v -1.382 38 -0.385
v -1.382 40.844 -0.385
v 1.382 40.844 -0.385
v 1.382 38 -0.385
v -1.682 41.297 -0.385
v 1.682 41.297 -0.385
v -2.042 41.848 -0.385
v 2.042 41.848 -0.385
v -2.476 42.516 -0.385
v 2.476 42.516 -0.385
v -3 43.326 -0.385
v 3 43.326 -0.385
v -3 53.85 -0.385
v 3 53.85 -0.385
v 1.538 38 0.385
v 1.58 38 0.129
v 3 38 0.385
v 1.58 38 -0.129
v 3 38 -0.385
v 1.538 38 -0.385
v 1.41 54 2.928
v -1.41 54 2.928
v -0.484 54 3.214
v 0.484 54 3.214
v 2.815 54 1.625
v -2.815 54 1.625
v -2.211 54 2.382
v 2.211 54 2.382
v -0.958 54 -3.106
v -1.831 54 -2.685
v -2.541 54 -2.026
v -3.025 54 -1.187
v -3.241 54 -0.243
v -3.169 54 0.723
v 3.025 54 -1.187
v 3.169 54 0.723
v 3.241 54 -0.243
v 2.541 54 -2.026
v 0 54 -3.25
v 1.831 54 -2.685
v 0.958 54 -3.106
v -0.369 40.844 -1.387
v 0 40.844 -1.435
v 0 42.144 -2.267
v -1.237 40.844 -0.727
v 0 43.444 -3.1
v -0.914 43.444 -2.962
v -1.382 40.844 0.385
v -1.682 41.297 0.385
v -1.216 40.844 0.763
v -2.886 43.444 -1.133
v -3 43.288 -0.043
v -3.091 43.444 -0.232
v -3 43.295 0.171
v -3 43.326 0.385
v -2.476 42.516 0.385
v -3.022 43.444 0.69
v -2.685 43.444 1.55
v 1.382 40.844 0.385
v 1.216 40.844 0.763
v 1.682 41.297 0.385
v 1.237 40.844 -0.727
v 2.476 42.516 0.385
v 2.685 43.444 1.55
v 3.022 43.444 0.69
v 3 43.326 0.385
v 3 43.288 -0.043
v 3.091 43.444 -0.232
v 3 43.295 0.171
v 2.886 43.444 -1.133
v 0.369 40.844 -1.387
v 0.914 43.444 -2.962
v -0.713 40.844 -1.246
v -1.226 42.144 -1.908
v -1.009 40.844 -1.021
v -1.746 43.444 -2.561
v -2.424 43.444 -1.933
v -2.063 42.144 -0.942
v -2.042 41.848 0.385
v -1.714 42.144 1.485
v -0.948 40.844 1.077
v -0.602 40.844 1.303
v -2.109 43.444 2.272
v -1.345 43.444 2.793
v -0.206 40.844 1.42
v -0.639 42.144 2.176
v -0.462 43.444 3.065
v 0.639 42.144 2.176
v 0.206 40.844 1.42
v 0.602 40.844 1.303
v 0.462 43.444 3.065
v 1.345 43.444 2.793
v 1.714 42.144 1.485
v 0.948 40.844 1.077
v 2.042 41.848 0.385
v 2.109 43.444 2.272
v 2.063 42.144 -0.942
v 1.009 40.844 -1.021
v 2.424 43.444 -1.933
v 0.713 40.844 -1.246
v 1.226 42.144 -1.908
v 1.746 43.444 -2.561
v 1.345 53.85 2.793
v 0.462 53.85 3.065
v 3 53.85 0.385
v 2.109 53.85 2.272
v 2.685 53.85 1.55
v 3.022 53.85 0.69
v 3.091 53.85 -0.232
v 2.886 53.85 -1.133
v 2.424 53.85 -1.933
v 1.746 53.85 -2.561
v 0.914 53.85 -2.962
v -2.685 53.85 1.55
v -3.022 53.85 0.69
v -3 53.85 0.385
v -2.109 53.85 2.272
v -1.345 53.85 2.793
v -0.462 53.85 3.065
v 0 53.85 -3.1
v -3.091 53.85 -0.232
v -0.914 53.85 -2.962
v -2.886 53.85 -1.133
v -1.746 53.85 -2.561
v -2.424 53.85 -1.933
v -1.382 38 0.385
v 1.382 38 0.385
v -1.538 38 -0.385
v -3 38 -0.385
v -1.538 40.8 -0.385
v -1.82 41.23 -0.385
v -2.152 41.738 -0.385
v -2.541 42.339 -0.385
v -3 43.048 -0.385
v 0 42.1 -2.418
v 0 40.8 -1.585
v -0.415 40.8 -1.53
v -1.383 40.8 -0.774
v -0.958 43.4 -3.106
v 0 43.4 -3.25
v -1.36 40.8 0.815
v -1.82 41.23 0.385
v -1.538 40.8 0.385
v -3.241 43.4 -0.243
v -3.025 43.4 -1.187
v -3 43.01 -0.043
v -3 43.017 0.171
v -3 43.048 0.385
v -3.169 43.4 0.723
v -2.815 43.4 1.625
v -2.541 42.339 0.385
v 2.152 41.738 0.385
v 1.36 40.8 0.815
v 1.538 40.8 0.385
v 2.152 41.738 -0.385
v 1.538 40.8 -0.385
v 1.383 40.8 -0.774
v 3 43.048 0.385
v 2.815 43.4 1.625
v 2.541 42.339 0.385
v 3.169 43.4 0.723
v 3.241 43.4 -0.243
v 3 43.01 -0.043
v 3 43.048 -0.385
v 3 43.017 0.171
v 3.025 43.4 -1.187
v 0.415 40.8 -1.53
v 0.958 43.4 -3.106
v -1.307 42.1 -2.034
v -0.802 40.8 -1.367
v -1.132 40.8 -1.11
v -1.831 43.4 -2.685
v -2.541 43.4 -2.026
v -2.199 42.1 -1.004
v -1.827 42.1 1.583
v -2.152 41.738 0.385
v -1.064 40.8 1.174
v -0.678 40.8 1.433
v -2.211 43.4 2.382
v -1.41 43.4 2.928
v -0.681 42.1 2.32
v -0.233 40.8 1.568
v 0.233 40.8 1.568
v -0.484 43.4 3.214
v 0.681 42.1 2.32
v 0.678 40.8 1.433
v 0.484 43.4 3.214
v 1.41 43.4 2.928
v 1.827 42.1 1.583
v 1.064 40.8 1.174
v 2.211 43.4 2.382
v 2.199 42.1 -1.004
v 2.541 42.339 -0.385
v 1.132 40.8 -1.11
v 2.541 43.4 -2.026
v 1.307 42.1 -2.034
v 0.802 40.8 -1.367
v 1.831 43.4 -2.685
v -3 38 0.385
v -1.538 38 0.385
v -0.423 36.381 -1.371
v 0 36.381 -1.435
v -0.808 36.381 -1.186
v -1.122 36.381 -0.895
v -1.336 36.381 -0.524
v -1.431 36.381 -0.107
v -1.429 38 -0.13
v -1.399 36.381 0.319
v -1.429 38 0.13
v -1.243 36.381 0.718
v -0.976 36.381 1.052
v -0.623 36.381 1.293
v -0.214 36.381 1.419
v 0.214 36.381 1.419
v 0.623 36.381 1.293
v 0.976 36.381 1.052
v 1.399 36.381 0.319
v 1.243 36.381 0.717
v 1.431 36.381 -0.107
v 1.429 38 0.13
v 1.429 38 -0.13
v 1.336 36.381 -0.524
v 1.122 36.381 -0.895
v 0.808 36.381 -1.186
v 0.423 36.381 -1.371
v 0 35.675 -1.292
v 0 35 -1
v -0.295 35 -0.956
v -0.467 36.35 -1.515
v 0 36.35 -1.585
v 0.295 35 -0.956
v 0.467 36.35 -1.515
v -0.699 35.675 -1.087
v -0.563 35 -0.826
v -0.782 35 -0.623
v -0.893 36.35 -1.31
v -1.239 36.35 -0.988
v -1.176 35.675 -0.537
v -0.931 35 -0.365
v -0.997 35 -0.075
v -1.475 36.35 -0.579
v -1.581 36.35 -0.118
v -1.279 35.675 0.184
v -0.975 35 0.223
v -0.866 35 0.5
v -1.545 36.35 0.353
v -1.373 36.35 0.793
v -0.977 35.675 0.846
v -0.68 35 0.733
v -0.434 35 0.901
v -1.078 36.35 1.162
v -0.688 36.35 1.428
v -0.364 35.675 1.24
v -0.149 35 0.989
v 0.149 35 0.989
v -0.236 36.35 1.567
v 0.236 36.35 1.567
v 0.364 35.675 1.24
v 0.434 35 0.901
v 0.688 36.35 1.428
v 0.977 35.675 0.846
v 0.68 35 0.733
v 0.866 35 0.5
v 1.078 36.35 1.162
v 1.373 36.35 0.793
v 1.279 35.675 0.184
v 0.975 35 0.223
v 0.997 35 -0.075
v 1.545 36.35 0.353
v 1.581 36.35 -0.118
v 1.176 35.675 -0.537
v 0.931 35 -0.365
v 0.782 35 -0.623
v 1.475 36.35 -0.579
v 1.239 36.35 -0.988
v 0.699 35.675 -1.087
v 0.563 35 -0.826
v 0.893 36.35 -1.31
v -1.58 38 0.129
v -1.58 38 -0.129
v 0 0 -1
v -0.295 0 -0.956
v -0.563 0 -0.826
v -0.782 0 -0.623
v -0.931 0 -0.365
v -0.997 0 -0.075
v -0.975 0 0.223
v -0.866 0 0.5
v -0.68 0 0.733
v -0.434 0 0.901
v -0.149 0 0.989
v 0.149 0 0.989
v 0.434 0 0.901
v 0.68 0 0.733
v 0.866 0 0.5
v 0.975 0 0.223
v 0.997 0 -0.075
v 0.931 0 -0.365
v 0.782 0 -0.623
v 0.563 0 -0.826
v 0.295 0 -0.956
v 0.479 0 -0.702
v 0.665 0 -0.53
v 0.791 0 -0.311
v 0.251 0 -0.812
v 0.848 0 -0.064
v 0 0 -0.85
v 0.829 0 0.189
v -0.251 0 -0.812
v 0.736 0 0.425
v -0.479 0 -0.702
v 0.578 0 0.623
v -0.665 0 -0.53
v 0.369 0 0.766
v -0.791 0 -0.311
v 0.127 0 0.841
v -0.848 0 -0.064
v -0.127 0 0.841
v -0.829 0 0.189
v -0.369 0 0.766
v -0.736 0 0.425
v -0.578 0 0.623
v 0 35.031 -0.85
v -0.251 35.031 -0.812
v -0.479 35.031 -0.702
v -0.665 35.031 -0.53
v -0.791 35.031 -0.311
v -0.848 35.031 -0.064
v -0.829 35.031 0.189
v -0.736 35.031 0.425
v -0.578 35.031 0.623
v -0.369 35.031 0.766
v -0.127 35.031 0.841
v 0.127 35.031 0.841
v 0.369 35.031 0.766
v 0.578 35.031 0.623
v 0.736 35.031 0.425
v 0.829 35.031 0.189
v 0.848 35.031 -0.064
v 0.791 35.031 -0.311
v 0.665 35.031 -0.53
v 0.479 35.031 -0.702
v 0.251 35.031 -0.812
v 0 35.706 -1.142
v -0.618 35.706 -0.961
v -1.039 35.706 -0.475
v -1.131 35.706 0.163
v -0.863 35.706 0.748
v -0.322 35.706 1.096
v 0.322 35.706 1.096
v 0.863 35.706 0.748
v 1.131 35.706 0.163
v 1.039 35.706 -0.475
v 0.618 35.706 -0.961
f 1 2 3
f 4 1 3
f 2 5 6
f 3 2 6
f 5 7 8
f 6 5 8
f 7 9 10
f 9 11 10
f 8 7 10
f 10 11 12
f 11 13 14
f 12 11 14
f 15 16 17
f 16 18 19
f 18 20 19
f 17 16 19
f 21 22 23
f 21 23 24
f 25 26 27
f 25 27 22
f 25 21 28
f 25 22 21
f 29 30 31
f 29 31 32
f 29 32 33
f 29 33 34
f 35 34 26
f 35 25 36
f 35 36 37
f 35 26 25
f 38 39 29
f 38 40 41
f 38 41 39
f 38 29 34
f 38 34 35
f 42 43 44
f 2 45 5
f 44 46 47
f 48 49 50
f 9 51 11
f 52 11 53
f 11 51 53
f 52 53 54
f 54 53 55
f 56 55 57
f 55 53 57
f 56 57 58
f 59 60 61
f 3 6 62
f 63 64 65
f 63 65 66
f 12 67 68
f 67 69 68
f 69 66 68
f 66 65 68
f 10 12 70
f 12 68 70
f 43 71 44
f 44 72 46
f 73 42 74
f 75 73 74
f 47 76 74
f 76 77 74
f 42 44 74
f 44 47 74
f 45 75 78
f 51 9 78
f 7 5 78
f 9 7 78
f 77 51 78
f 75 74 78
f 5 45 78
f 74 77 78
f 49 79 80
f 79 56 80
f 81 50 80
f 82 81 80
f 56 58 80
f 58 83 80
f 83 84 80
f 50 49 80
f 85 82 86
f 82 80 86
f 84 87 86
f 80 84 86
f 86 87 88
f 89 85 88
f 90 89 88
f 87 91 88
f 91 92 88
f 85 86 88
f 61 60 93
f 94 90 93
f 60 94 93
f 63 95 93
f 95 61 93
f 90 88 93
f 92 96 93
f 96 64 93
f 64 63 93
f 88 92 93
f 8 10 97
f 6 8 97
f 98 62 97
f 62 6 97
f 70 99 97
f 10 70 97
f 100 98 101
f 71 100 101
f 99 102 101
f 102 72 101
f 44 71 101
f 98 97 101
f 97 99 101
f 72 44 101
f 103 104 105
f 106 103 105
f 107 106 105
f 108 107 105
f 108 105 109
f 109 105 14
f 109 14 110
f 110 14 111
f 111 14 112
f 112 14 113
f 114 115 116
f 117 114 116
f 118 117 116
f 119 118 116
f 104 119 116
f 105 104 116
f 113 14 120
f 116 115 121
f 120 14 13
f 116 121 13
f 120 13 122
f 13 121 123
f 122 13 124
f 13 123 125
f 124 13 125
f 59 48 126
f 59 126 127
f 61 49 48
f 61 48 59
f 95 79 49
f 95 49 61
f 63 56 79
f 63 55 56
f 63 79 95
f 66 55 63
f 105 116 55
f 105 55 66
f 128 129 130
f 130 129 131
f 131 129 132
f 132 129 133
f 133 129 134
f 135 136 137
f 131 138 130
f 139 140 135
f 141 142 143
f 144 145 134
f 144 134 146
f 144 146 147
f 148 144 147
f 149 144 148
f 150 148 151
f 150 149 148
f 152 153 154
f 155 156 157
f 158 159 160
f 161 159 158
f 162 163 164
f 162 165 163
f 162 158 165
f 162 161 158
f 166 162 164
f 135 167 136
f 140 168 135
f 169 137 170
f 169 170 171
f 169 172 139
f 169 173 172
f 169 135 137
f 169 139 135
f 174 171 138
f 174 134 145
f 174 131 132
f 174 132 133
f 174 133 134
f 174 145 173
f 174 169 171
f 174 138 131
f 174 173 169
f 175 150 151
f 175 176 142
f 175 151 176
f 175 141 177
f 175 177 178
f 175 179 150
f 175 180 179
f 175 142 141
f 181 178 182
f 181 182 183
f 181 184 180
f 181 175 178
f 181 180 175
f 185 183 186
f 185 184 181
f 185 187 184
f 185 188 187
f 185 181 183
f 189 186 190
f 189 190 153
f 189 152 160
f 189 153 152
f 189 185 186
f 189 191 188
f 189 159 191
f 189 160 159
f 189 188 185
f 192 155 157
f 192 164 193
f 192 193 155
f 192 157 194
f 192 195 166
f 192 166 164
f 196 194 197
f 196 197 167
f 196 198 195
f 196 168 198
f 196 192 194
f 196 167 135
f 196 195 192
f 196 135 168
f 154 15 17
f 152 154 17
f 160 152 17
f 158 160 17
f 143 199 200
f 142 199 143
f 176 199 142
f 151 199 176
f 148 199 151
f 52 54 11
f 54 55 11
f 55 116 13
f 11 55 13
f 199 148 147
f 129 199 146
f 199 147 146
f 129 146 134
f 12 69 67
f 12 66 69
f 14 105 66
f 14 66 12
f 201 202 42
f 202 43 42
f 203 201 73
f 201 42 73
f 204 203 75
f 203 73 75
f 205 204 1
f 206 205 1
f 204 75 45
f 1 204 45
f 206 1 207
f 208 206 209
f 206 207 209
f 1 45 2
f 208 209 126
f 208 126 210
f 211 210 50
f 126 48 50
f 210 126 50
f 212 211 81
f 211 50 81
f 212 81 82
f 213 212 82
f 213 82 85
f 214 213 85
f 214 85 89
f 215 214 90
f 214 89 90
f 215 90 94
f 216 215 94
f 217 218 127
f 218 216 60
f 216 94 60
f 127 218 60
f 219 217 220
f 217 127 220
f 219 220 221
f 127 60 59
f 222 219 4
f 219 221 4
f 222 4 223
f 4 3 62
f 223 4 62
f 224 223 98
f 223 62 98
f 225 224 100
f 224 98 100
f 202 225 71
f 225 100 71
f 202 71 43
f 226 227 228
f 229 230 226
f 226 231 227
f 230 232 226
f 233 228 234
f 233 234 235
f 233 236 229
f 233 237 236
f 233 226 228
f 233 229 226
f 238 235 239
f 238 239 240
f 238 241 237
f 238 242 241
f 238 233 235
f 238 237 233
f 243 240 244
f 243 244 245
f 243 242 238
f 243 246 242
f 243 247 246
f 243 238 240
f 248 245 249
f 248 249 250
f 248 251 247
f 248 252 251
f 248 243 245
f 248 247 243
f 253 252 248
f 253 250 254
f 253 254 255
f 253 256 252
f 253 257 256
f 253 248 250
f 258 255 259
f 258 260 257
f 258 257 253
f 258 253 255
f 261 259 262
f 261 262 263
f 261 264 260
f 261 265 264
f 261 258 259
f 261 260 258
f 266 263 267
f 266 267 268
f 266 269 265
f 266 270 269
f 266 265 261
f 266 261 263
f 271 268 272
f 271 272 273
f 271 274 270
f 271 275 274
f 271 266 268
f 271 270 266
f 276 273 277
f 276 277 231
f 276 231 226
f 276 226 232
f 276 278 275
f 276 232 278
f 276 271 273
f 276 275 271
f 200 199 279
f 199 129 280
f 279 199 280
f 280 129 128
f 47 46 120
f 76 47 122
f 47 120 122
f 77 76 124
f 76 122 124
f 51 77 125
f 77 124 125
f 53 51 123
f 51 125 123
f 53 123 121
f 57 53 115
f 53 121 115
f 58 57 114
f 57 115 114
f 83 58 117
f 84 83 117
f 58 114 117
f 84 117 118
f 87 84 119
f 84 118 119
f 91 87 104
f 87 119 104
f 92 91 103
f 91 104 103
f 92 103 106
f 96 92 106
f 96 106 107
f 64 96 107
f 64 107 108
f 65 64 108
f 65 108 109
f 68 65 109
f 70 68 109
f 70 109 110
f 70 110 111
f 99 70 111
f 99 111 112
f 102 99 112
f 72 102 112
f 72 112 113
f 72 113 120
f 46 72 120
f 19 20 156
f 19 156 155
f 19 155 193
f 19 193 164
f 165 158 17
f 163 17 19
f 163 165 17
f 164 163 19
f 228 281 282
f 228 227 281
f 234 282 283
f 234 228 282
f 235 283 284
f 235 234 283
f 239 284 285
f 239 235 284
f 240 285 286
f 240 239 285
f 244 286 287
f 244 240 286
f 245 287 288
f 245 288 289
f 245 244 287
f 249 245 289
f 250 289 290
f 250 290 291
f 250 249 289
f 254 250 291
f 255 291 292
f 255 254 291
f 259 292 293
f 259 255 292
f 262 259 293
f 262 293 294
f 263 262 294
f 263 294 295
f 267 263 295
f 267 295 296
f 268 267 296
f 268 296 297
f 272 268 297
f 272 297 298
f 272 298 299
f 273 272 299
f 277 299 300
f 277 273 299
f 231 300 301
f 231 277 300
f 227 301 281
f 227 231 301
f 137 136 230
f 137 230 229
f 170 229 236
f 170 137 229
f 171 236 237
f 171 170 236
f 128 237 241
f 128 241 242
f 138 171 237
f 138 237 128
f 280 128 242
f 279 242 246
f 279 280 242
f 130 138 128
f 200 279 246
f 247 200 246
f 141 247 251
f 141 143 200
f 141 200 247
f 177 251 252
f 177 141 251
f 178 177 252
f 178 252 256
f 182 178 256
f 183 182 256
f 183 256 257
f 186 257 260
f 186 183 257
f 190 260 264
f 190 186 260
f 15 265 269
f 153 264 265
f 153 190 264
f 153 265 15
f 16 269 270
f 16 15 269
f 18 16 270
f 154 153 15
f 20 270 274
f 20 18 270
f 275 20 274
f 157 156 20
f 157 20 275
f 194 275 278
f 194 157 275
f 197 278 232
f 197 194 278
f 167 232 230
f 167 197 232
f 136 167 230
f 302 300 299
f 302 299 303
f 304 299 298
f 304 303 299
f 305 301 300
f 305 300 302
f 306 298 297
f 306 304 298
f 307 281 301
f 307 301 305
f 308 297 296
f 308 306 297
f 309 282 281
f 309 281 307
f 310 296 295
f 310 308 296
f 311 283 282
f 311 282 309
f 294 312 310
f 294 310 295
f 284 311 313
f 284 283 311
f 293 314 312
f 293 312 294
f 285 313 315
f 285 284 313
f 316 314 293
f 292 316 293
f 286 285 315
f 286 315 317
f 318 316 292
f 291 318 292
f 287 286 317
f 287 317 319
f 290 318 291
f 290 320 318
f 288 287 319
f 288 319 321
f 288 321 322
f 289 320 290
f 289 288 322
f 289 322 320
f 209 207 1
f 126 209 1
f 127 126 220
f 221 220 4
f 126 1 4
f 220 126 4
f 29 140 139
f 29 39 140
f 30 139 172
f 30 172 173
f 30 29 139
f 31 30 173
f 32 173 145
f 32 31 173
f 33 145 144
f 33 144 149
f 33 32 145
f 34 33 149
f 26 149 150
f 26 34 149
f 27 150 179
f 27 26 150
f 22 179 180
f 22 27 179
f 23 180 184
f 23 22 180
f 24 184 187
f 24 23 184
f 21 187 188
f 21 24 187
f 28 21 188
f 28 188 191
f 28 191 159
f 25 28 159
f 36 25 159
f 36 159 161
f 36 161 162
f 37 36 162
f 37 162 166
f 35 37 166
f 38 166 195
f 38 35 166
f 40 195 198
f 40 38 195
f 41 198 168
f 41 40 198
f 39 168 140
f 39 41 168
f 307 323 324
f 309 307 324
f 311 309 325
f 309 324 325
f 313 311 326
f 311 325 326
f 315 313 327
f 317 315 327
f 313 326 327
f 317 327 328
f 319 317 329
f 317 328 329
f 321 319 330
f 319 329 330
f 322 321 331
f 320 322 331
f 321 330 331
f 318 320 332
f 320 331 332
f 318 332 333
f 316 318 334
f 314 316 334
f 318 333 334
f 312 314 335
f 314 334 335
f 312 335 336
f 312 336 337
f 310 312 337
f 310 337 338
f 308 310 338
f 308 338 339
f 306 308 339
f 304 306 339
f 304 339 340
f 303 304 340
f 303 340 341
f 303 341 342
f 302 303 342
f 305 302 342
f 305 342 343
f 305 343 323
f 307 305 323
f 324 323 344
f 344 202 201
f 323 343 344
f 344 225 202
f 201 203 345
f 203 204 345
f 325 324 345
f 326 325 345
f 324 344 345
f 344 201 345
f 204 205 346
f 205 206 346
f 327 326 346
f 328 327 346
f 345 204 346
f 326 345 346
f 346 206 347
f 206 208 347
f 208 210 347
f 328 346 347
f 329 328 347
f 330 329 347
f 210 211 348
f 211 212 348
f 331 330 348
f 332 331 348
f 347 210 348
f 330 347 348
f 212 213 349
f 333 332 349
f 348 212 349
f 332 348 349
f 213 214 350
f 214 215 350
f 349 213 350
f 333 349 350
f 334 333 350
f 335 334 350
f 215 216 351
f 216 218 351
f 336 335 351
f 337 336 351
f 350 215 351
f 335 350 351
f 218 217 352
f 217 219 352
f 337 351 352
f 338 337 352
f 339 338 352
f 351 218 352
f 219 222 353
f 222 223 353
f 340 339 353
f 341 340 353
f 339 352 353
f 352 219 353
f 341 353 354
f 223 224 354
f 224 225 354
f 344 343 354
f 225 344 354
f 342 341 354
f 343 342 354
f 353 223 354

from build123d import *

# Parameters (mm, degrees)
SKETCH1_W           = 1
SKETCH1_H           = 35
SHELL1_T            = -0.15
SKETCH2_W           = 6
SKETCH2_H           = 0.77
BOSS_EXTRUDE1_DEPTH = 16


with BuildPart() as part:
    # Sketch1 → Revolve1 (revolve)
    with BuildSketch(Plane.XY, mode=Mode.PRIVATE) as revolve1_sk:
        Polygon((0, 40.8), (1.585, 40.8), (3.25, 43.4), (3.25, 54), (0, 54), align=None)
        Polygon((0, 35), (1, 35), (1.585, 36.35), (1.585, 40.8), (0, 40.8), align=None)
        with Locations((0.5, 17.5)):
            Rectangle(SKETCH1_W, SKETCH1_H)
    revolve(revolve1_sk.sketch.rotate(Axis((0, 40.8, 0), (0, 1, 0)), 90), axis=Axis((0, 40.8, 0), (0, 1, 0)))

    # Shell1
    shell1_openings = [part.faces().sort_by_distance(p)[0] for p in [
        (0, 0, 0),
    ]]
    offset(amount=SHELL1_T, openings=shell1_openings, kind=Kind.INTERSECTION)

    # Sketch2 → Boss-Extrude1 (add)
    with BuildSketch(Plane(origin=(0, 54, 0), x_dir=(1, 0, 0), z_dir=(0, 1, 0))):
        Rectangle(SKETCH2_W, SKETCH2_H)
    extrude(amount=-BOSS_EXTRUDE1_DEPTH)


solid = part.part
